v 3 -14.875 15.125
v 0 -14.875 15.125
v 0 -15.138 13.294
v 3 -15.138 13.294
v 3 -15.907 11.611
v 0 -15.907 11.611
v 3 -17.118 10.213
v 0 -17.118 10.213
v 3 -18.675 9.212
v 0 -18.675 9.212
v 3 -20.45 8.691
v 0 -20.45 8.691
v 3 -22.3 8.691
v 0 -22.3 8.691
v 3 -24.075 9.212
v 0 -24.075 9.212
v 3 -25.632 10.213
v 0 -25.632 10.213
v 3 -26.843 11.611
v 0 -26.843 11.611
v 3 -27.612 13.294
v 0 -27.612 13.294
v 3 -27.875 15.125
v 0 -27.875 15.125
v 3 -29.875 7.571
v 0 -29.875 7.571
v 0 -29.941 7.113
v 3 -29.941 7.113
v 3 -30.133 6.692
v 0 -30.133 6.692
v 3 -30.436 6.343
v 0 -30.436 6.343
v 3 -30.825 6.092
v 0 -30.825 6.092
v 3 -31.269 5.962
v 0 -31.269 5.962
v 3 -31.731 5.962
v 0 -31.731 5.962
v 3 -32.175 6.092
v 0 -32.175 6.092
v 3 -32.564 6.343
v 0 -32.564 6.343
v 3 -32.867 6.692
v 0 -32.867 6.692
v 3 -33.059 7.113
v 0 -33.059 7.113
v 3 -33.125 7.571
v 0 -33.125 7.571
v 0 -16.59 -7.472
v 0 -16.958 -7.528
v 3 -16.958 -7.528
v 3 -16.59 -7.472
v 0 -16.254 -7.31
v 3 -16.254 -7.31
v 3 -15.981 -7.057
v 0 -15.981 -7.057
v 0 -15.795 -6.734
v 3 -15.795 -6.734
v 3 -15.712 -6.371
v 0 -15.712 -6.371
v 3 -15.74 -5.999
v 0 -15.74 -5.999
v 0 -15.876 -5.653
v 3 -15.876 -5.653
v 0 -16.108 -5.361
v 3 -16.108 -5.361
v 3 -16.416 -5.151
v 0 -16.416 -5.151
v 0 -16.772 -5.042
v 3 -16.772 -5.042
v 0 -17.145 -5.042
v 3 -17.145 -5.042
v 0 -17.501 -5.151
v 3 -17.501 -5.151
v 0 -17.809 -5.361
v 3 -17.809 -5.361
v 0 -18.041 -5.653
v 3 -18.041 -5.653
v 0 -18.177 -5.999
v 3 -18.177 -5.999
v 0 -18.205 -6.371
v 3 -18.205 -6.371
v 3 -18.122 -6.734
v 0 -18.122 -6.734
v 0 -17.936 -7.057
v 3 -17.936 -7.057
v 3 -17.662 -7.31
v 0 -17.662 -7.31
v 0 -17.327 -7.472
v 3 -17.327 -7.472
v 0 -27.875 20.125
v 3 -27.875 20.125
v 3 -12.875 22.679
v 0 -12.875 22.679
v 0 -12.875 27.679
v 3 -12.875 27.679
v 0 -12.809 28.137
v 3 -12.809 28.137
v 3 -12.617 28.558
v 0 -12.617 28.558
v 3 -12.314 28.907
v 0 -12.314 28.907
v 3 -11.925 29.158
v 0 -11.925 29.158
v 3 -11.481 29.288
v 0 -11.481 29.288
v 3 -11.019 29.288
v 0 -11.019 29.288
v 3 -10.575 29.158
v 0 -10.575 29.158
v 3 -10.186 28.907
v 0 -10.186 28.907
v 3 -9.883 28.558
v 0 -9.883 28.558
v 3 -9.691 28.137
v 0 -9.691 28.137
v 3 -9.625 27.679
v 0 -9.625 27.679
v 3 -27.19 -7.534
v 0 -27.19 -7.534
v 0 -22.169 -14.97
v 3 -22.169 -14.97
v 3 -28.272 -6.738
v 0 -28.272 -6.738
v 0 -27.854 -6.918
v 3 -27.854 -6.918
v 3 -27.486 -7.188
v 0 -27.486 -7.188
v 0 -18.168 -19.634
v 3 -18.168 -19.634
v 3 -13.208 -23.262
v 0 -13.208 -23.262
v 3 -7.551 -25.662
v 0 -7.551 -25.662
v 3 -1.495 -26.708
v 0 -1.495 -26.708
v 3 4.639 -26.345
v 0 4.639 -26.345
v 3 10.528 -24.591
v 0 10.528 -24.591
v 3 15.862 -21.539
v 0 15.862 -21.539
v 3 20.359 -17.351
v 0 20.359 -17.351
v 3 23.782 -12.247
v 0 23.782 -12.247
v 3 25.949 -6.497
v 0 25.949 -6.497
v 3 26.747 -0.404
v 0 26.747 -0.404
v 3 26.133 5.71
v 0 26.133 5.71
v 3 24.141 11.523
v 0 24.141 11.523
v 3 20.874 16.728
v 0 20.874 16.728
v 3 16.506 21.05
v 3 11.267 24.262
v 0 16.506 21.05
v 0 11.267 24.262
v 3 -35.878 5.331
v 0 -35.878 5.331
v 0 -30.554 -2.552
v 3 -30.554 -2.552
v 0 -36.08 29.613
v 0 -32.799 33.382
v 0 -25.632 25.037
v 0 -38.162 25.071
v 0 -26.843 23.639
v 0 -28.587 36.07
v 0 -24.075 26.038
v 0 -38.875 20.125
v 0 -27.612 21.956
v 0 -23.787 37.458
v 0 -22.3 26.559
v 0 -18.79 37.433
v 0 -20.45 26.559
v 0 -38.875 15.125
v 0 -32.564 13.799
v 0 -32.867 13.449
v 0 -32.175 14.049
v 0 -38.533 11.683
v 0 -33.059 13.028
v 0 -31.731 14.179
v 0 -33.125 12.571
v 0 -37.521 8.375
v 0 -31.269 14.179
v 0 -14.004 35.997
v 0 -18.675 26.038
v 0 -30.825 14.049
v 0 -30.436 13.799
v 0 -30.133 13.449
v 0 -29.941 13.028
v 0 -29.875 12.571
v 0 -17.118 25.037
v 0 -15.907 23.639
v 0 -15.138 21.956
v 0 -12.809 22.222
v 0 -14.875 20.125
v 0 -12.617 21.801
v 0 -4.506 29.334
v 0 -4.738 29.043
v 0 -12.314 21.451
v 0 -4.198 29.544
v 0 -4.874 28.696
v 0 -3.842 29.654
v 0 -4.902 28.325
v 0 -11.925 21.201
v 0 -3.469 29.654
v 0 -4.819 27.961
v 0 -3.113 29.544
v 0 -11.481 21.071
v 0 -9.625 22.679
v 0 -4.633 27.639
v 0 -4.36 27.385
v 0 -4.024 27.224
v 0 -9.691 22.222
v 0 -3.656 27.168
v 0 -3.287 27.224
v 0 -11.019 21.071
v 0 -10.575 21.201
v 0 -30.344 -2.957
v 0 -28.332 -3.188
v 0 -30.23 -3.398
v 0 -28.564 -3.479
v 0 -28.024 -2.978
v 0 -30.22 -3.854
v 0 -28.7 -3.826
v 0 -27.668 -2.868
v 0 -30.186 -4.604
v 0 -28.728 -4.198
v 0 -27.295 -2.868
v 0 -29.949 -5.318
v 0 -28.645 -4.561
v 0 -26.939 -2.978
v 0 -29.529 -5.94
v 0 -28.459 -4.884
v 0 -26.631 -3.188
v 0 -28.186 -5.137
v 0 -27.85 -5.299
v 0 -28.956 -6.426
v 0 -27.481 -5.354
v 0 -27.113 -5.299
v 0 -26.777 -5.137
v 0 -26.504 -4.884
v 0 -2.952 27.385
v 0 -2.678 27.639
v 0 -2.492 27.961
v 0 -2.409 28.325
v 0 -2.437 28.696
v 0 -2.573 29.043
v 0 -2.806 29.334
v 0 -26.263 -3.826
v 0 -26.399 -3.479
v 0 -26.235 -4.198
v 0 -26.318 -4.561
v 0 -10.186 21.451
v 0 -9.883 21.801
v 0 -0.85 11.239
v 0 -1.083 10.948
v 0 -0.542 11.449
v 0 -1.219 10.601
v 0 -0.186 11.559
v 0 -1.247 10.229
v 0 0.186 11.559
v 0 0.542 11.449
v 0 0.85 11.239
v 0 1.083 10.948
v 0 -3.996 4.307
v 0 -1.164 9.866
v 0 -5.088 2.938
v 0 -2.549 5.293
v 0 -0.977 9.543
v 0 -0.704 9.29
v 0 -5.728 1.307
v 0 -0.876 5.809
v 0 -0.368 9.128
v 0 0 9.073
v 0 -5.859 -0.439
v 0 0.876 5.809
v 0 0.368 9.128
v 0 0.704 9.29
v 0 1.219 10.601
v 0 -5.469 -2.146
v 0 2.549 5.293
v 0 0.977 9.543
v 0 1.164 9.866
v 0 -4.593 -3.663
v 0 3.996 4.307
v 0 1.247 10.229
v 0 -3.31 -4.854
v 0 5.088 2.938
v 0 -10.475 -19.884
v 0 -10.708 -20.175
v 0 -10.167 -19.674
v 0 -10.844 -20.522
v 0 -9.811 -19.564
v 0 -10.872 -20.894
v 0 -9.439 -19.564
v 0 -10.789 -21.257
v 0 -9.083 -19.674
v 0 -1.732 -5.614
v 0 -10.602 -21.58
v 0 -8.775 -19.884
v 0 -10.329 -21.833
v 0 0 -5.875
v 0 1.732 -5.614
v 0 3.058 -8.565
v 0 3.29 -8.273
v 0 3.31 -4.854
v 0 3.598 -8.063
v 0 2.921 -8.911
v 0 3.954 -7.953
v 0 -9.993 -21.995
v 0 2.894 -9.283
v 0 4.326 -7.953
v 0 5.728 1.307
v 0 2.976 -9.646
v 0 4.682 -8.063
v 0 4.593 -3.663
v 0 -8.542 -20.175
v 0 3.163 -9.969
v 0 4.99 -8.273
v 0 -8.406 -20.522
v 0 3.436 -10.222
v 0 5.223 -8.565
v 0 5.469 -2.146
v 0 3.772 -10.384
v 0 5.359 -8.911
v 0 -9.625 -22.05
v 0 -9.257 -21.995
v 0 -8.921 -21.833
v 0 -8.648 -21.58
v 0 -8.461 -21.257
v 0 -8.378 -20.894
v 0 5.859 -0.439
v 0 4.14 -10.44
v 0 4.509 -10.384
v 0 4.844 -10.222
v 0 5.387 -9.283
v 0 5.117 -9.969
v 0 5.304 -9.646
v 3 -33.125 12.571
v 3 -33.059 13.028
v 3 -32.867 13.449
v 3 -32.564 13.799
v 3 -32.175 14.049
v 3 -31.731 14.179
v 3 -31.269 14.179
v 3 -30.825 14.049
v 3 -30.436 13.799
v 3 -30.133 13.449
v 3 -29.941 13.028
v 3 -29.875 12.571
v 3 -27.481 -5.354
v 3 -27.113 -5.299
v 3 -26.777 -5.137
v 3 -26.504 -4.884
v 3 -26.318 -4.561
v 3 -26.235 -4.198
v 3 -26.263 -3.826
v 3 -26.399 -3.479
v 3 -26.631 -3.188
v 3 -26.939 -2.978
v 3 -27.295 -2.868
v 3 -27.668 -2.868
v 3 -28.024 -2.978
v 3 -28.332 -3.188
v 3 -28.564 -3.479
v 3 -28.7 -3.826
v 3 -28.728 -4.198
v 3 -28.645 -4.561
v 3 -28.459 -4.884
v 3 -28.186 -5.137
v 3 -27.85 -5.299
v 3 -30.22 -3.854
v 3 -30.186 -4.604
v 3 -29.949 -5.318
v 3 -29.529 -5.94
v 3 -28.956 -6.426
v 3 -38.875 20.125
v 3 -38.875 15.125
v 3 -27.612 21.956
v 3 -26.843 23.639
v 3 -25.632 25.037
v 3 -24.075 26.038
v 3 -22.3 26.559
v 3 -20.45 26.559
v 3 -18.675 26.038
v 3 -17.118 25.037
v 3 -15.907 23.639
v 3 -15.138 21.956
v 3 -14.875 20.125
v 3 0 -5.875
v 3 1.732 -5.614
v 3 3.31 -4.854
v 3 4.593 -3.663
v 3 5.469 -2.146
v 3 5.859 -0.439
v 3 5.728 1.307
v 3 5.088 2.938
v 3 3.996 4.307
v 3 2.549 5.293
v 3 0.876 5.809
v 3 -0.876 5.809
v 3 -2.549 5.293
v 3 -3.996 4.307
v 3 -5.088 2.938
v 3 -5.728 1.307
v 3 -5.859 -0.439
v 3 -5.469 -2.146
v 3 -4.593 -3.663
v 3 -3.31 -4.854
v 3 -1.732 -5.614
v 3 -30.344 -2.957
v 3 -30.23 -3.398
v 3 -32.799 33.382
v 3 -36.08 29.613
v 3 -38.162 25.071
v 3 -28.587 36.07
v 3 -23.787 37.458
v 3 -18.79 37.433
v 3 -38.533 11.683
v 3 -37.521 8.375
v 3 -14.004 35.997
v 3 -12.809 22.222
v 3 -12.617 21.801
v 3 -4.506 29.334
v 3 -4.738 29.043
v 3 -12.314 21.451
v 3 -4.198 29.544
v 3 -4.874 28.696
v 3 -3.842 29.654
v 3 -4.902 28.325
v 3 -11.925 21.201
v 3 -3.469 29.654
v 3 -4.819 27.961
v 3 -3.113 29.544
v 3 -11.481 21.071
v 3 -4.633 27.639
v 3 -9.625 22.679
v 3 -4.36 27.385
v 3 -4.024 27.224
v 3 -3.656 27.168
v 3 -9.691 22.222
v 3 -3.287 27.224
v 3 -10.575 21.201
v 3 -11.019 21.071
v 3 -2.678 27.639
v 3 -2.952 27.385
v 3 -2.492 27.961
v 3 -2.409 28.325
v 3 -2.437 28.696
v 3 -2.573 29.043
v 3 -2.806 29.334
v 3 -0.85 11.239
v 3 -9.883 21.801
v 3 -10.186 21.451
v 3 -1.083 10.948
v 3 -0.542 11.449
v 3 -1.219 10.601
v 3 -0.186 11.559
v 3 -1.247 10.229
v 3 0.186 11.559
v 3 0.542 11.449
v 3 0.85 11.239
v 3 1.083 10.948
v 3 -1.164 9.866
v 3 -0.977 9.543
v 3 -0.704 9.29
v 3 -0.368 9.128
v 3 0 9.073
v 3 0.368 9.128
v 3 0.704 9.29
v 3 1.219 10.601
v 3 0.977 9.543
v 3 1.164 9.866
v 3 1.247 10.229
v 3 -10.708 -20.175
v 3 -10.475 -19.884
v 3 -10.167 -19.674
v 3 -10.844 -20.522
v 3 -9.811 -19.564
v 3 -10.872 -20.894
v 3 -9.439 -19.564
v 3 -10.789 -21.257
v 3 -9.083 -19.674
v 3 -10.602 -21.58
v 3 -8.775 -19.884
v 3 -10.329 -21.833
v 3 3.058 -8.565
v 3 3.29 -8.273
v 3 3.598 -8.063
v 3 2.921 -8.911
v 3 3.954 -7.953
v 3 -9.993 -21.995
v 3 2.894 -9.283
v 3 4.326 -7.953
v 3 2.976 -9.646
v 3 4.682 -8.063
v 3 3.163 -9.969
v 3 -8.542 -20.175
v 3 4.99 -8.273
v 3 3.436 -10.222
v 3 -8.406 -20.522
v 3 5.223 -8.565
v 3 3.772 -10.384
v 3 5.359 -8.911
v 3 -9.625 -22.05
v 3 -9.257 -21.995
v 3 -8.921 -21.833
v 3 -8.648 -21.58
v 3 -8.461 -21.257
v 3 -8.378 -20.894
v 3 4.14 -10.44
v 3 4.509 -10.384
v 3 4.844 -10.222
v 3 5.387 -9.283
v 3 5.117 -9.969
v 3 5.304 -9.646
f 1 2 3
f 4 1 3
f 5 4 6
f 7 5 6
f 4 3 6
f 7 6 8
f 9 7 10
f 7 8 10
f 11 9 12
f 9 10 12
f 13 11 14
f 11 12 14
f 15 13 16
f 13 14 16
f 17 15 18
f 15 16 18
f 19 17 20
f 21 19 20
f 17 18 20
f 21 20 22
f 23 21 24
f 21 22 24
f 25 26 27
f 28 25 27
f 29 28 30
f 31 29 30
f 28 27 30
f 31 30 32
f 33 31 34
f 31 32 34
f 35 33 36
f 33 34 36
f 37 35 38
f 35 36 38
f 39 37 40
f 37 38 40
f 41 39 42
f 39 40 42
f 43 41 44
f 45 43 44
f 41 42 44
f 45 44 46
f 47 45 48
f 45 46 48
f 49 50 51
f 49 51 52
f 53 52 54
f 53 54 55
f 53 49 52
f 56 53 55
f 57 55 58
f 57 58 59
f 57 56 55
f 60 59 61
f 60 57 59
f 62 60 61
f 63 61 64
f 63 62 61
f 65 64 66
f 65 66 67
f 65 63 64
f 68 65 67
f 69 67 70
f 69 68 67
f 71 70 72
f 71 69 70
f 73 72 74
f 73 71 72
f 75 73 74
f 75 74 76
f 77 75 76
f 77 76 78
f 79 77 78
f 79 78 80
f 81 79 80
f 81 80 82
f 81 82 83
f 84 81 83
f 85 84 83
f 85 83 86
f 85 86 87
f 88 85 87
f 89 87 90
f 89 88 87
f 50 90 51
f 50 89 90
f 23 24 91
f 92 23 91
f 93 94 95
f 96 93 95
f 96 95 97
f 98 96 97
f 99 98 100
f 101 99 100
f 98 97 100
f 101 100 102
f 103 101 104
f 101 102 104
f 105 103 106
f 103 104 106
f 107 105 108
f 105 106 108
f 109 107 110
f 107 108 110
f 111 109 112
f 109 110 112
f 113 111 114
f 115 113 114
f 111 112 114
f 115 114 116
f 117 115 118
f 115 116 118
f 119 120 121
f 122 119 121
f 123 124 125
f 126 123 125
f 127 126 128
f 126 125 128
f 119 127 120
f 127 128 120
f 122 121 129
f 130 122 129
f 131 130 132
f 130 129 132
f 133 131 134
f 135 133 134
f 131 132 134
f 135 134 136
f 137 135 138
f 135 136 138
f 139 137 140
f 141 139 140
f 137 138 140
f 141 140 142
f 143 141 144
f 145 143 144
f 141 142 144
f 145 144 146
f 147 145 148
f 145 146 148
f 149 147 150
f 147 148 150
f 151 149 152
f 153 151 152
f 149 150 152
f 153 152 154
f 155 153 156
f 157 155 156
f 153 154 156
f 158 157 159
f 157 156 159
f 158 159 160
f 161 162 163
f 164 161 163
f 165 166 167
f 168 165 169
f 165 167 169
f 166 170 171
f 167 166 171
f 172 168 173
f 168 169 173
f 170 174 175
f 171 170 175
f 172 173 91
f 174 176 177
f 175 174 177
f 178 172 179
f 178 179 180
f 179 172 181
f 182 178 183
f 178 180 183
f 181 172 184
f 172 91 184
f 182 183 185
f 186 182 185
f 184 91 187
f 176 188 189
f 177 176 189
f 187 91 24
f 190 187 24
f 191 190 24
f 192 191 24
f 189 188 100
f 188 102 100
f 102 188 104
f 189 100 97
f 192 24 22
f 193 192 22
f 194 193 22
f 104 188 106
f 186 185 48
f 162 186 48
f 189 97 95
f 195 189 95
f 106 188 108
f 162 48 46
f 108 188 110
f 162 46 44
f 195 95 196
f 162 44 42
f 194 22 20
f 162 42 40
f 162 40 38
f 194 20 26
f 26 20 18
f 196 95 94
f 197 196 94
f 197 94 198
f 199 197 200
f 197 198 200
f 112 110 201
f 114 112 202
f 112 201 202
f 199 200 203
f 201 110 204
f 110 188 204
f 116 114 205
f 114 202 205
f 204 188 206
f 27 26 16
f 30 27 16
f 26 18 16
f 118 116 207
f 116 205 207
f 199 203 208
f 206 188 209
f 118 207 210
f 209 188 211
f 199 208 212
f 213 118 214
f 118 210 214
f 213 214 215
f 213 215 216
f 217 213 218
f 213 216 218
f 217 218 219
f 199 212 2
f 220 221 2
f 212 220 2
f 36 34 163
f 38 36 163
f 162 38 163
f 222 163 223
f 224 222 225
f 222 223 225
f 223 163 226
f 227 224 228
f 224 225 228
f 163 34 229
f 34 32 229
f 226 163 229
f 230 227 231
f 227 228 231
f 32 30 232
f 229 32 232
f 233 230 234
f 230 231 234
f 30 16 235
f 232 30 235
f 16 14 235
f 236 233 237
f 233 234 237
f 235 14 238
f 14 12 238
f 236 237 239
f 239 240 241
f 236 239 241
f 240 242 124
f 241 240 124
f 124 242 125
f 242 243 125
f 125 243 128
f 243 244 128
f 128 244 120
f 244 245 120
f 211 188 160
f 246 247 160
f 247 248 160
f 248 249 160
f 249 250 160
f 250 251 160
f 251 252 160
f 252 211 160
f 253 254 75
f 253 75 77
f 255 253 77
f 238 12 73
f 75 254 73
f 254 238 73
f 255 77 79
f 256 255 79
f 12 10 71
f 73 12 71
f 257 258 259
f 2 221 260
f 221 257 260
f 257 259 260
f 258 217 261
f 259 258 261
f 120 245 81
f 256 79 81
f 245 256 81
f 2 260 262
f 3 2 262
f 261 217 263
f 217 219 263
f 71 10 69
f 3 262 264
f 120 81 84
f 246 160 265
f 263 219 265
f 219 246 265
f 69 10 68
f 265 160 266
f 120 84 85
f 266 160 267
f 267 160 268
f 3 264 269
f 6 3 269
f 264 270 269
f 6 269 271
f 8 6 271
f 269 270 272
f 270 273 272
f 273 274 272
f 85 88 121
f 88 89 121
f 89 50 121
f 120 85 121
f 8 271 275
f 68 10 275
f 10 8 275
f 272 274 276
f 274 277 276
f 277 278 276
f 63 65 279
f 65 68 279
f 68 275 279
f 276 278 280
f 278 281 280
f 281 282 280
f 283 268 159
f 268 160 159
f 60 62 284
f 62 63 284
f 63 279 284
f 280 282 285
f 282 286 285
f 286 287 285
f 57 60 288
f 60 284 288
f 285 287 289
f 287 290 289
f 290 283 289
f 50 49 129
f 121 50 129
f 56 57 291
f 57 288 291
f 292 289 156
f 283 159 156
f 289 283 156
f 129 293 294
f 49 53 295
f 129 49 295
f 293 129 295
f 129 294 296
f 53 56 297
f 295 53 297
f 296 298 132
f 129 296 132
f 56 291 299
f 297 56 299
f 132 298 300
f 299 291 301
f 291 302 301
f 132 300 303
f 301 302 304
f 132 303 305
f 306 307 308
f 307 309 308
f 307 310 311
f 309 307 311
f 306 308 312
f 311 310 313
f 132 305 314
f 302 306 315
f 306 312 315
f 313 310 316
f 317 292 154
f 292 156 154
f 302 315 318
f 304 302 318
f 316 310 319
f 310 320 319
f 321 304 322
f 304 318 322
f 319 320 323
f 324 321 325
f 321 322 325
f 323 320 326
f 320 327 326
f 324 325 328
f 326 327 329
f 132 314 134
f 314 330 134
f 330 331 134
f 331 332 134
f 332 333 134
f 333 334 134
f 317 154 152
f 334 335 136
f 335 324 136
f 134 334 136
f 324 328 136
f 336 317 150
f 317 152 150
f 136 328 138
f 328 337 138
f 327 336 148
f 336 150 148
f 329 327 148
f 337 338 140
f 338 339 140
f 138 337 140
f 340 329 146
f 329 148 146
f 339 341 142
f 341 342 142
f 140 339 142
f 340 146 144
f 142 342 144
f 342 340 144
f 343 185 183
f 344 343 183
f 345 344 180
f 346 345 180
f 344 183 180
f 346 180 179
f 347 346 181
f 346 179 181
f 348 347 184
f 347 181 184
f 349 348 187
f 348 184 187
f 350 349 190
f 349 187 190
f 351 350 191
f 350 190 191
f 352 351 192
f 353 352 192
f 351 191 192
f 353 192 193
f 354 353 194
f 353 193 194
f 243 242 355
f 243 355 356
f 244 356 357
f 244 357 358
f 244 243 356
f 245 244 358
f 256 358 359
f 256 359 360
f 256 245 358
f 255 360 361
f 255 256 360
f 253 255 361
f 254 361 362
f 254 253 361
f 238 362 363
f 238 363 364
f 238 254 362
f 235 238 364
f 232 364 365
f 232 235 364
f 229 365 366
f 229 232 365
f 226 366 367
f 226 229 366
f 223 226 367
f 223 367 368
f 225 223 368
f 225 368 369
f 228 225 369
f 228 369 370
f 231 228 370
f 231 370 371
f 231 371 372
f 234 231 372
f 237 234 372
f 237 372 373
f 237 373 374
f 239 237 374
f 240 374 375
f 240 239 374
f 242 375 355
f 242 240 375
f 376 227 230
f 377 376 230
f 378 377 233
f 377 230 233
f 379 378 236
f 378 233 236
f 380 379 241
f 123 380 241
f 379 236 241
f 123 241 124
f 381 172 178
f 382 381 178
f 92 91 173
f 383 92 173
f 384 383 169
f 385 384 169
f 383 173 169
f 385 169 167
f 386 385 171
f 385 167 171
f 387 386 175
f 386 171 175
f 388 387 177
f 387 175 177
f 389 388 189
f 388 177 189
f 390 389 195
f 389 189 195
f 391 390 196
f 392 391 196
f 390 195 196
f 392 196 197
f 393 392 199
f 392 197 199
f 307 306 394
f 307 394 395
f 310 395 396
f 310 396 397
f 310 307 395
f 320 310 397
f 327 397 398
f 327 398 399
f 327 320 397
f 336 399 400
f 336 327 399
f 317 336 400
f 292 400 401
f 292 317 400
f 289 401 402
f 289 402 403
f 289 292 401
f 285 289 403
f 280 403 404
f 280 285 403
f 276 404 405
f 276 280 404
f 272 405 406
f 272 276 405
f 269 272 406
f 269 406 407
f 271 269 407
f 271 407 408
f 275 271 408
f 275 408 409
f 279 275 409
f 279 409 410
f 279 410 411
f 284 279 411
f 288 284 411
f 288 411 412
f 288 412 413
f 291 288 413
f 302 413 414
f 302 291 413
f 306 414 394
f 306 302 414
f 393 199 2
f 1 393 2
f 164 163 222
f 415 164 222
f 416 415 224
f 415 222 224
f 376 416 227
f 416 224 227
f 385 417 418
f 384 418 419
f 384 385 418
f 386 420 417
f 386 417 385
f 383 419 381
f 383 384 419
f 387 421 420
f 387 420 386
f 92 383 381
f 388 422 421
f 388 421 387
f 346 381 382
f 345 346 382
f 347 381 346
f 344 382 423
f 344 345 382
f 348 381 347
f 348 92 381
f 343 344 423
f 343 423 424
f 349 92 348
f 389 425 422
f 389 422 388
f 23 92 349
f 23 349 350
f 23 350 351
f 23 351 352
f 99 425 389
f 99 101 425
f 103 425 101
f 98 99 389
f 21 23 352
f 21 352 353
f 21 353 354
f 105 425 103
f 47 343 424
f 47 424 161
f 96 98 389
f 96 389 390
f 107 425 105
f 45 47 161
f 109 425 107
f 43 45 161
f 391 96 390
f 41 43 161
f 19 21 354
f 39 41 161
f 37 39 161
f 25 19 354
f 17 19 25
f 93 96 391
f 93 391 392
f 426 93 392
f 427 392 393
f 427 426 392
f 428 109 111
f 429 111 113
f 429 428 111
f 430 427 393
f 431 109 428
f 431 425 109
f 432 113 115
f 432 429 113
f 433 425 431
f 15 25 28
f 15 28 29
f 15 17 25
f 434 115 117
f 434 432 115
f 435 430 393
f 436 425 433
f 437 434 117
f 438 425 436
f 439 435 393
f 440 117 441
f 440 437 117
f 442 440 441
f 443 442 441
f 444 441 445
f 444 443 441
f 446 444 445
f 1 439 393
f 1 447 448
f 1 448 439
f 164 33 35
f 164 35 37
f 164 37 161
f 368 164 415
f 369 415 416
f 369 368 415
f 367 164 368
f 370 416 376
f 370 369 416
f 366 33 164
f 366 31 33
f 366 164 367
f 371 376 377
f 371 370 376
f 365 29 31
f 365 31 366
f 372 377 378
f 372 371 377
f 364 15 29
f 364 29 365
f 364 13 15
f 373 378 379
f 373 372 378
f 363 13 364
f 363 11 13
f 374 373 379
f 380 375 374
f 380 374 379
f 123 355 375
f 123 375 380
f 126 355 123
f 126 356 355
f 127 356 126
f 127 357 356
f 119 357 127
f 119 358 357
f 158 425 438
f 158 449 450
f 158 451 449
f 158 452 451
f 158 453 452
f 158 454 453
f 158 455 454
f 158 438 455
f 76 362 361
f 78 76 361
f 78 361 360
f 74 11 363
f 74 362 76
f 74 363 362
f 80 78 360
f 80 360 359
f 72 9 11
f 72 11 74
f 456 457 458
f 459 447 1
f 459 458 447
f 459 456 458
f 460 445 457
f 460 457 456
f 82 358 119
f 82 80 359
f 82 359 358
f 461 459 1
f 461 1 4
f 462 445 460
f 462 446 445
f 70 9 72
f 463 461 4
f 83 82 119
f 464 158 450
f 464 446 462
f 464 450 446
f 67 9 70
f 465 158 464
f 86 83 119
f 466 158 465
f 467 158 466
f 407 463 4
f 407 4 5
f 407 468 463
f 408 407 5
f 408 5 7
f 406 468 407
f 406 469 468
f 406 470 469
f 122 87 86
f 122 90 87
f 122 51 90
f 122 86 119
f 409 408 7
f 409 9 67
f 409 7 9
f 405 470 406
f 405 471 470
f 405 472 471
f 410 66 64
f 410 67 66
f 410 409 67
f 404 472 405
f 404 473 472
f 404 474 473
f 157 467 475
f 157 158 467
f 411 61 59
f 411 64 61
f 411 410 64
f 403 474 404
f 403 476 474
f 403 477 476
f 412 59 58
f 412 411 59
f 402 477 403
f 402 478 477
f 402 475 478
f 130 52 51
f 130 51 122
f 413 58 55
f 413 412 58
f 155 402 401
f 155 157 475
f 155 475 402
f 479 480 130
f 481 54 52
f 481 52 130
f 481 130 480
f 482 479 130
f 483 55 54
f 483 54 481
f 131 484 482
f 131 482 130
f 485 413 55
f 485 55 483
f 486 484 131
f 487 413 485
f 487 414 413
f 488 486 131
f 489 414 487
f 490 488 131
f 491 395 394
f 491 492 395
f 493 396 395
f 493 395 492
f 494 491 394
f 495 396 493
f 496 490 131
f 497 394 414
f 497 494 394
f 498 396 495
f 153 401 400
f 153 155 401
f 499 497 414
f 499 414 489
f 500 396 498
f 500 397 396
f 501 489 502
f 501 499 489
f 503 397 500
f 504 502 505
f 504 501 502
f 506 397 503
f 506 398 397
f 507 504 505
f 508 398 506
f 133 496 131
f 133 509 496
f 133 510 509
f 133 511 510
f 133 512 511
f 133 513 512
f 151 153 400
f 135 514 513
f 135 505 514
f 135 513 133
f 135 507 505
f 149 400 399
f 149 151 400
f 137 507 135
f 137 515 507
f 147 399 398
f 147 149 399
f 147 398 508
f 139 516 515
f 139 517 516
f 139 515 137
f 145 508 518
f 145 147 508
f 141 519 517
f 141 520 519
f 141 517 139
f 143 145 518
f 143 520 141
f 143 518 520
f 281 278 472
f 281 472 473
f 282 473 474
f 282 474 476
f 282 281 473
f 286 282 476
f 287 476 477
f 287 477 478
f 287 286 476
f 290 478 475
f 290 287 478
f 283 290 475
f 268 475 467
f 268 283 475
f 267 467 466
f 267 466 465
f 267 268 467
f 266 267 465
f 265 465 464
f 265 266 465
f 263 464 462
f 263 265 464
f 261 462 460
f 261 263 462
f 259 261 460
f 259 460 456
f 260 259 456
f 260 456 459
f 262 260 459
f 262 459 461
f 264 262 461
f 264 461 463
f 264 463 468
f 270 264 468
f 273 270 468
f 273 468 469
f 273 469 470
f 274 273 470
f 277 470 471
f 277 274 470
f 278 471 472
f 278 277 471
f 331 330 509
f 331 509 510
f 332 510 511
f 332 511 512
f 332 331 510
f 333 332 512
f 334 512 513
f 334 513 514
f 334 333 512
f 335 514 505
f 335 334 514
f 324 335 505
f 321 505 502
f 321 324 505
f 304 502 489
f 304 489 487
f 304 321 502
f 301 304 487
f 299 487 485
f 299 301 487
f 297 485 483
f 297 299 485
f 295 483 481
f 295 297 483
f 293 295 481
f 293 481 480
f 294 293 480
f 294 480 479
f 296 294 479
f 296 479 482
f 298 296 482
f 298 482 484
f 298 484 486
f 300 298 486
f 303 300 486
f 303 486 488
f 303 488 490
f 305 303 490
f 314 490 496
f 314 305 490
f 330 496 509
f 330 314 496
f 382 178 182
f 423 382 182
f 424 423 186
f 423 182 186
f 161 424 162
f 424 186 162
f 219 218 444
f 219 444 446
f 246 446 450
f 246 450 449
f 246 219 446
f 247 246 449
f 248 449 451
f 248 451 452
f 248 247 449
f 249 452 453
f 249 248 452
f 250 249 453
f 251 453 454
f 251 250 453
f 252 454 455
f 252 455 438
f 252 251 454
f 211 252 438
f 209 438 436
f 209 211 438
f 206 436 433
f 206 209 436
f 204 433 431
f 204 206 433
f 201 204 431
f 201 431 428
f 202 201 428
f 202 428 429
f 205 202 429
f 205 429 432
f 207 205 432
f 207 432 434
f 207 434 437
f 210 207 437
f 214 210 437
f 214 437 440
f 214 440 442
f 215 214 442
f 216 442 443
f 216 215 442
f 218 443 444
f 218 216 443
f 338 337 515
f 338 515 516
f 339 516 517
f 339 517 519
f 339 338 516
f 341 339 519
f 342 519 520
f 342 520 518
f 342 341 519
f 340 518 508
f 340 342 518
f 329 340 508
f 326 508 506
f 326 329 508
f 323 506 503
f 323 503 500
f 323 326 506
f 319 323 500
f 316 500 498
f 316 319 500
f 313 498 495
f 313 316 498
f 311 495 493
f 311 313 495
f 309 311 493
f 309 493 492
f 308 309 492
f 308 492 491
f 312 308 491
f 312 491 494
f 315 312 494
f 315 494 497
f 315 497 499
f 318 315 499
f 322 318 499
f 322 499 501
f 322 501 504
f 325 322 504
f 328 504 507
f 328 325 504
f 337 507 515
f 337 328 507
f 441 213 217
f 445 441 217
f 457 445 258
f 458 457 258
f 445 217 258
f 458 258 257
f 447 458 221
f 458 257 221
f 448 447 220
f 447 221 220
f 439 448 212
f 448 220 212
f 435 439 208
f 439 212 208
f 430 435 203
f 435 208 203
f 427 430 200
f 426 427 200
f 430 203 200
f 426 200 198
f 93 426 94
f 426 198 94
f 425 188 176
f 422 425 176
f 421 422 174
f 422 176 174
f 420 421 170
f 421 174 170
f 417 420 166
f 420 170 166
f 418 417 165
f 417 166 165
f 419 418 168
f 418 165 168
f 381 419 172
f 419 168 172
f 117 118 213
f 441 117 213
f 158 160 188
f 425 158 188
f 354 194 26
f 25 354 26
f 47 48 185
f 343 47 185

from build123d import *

# Parameters (mm, degrees)
SKETCH3_R           = 1.25
SKETCH3_R_2         = 5.875
BOSS_EXTRUDE2_DEPTH = 3


with BuildPart() as part:
    # Sketch3 → Boss-Extrude2 (new body)
    with BuildSketch(Plane(origin=(0, 0, 0), x_dir=(0, 0, -1), z_dir=(1, 0, 0))):
        with BuildLine():
            Line((-24.261559398, 11.266731363), (-35.997048204, -14.004241165))
            ThreePointArc((-35.997048204, -14.004241165), (-34.876919869, -30.789396433), (-20.125, -38.875))
            Line((-20.125, -38.875), (-15.125, -38.875))
            ThreePointArc((-15.125, -38.875), (-10.004093471, -38.108986863), (-5.33149342, -35.87800758))
            Line((-5.33149342, -35.87800758), (2.552389063, -30.554225285))
            ThreePointArc((2.552389063, -30.554225285), (3.174199215, -30.274562996), (3.853820115, -30.220025911))
            ThreePointArc((3.853820115, -30.220025911), (5.64328781, -29.760501772), (6.738132443, -28.272324263))
            ThreePointArc((6.738132443, -28.272324263), (7.042647171, -27.662299968), (7.534383085, -27.190013348))
            Line((7.534383085, -27.190013348), (14.970074344, -22.168883015))
            ThreePointArc((14.970074344, -22.168883015), (17.351311214, 20.359137977), (-24.261559398, 11.266731363))
        make_face()
        with BuildLine():
            Line((-20.125, -14.875), (-15.125, -14.875))
            ThreePointArc((-15.125, -14.875), (-8.625, -21.375), (-15.125, -27.875))
            Line((-15.125, -27.875), (-20.125, -27.875))
            ThreePointArc((-20.125, -27.875), (-26.625, -21.375), (-20.125, -14.875))
        make_face(mode=Mode.SUBTRACT)
        with BuildLine():
            Line((-22.679384039, -12.875), (-27.679384039, -12.875))
            ThreePointArc((-27.679384039, -12.875), (-29.304384039, -11.25), (-27.679384039, -9.625))
            Line((-27.679384039, -9.625), (-22.679384039, -9.625))
            ThreePointArc((-22.679384039, -9.625), (-21.054384039, -11.25), (-22.679384039, -12.875))
        make_face(mode=Mode.SUBTRACT)
        with Locations((4.104308205, -27.481457724)):
            Circle(SKETCH3_R, mode=Mode.SUBTRACT)
        with Locations((6.277610864, -16.958330561)):
            Circle(SKETCH3_R, mode=Mode.SUBTRACT)
        with Locations((20.80047509, -9.625)):
            Circle(SKETCH3_R, mode=Mode.SUBTRACT)
        with Locations((-10.322617138, 0)):
            Circle(SKETCH3_R, mode=Mode.SUBTRACT)
        Circle(SKETCH3_R_2, mode=Mode.SUBTRACT)
        with Locations((9.189505152, 4.140062296)):
            Circle(SKETCH3_R, mode=Mode.SUBTRACT)
        with BuildLine():
            Line((-7.570615961, -33.125), (-12.570615961, -33.125))
            ThreePointArc((-12.570615961, -33.125), (-14.195615961, -31.5), (-12.570615961, -29.875))
            Line((-12.570615961, -29.875), (-7.570615961, -29.875))
            ThreePointArc((-7.570615961, -29.875), (-5.945615961, -31.5), (-7.570615961, -33.125))
        make_face(mode=Mode.SUBTRACT)
        with Locations((-28.41801633, -3.655785684)):
            Circle(SKETCH3_R, mode=Mode.SUBTRACT)
    extrude(amount=BOSS_EXTRUDE2_DEPTH)


solid = part.part
